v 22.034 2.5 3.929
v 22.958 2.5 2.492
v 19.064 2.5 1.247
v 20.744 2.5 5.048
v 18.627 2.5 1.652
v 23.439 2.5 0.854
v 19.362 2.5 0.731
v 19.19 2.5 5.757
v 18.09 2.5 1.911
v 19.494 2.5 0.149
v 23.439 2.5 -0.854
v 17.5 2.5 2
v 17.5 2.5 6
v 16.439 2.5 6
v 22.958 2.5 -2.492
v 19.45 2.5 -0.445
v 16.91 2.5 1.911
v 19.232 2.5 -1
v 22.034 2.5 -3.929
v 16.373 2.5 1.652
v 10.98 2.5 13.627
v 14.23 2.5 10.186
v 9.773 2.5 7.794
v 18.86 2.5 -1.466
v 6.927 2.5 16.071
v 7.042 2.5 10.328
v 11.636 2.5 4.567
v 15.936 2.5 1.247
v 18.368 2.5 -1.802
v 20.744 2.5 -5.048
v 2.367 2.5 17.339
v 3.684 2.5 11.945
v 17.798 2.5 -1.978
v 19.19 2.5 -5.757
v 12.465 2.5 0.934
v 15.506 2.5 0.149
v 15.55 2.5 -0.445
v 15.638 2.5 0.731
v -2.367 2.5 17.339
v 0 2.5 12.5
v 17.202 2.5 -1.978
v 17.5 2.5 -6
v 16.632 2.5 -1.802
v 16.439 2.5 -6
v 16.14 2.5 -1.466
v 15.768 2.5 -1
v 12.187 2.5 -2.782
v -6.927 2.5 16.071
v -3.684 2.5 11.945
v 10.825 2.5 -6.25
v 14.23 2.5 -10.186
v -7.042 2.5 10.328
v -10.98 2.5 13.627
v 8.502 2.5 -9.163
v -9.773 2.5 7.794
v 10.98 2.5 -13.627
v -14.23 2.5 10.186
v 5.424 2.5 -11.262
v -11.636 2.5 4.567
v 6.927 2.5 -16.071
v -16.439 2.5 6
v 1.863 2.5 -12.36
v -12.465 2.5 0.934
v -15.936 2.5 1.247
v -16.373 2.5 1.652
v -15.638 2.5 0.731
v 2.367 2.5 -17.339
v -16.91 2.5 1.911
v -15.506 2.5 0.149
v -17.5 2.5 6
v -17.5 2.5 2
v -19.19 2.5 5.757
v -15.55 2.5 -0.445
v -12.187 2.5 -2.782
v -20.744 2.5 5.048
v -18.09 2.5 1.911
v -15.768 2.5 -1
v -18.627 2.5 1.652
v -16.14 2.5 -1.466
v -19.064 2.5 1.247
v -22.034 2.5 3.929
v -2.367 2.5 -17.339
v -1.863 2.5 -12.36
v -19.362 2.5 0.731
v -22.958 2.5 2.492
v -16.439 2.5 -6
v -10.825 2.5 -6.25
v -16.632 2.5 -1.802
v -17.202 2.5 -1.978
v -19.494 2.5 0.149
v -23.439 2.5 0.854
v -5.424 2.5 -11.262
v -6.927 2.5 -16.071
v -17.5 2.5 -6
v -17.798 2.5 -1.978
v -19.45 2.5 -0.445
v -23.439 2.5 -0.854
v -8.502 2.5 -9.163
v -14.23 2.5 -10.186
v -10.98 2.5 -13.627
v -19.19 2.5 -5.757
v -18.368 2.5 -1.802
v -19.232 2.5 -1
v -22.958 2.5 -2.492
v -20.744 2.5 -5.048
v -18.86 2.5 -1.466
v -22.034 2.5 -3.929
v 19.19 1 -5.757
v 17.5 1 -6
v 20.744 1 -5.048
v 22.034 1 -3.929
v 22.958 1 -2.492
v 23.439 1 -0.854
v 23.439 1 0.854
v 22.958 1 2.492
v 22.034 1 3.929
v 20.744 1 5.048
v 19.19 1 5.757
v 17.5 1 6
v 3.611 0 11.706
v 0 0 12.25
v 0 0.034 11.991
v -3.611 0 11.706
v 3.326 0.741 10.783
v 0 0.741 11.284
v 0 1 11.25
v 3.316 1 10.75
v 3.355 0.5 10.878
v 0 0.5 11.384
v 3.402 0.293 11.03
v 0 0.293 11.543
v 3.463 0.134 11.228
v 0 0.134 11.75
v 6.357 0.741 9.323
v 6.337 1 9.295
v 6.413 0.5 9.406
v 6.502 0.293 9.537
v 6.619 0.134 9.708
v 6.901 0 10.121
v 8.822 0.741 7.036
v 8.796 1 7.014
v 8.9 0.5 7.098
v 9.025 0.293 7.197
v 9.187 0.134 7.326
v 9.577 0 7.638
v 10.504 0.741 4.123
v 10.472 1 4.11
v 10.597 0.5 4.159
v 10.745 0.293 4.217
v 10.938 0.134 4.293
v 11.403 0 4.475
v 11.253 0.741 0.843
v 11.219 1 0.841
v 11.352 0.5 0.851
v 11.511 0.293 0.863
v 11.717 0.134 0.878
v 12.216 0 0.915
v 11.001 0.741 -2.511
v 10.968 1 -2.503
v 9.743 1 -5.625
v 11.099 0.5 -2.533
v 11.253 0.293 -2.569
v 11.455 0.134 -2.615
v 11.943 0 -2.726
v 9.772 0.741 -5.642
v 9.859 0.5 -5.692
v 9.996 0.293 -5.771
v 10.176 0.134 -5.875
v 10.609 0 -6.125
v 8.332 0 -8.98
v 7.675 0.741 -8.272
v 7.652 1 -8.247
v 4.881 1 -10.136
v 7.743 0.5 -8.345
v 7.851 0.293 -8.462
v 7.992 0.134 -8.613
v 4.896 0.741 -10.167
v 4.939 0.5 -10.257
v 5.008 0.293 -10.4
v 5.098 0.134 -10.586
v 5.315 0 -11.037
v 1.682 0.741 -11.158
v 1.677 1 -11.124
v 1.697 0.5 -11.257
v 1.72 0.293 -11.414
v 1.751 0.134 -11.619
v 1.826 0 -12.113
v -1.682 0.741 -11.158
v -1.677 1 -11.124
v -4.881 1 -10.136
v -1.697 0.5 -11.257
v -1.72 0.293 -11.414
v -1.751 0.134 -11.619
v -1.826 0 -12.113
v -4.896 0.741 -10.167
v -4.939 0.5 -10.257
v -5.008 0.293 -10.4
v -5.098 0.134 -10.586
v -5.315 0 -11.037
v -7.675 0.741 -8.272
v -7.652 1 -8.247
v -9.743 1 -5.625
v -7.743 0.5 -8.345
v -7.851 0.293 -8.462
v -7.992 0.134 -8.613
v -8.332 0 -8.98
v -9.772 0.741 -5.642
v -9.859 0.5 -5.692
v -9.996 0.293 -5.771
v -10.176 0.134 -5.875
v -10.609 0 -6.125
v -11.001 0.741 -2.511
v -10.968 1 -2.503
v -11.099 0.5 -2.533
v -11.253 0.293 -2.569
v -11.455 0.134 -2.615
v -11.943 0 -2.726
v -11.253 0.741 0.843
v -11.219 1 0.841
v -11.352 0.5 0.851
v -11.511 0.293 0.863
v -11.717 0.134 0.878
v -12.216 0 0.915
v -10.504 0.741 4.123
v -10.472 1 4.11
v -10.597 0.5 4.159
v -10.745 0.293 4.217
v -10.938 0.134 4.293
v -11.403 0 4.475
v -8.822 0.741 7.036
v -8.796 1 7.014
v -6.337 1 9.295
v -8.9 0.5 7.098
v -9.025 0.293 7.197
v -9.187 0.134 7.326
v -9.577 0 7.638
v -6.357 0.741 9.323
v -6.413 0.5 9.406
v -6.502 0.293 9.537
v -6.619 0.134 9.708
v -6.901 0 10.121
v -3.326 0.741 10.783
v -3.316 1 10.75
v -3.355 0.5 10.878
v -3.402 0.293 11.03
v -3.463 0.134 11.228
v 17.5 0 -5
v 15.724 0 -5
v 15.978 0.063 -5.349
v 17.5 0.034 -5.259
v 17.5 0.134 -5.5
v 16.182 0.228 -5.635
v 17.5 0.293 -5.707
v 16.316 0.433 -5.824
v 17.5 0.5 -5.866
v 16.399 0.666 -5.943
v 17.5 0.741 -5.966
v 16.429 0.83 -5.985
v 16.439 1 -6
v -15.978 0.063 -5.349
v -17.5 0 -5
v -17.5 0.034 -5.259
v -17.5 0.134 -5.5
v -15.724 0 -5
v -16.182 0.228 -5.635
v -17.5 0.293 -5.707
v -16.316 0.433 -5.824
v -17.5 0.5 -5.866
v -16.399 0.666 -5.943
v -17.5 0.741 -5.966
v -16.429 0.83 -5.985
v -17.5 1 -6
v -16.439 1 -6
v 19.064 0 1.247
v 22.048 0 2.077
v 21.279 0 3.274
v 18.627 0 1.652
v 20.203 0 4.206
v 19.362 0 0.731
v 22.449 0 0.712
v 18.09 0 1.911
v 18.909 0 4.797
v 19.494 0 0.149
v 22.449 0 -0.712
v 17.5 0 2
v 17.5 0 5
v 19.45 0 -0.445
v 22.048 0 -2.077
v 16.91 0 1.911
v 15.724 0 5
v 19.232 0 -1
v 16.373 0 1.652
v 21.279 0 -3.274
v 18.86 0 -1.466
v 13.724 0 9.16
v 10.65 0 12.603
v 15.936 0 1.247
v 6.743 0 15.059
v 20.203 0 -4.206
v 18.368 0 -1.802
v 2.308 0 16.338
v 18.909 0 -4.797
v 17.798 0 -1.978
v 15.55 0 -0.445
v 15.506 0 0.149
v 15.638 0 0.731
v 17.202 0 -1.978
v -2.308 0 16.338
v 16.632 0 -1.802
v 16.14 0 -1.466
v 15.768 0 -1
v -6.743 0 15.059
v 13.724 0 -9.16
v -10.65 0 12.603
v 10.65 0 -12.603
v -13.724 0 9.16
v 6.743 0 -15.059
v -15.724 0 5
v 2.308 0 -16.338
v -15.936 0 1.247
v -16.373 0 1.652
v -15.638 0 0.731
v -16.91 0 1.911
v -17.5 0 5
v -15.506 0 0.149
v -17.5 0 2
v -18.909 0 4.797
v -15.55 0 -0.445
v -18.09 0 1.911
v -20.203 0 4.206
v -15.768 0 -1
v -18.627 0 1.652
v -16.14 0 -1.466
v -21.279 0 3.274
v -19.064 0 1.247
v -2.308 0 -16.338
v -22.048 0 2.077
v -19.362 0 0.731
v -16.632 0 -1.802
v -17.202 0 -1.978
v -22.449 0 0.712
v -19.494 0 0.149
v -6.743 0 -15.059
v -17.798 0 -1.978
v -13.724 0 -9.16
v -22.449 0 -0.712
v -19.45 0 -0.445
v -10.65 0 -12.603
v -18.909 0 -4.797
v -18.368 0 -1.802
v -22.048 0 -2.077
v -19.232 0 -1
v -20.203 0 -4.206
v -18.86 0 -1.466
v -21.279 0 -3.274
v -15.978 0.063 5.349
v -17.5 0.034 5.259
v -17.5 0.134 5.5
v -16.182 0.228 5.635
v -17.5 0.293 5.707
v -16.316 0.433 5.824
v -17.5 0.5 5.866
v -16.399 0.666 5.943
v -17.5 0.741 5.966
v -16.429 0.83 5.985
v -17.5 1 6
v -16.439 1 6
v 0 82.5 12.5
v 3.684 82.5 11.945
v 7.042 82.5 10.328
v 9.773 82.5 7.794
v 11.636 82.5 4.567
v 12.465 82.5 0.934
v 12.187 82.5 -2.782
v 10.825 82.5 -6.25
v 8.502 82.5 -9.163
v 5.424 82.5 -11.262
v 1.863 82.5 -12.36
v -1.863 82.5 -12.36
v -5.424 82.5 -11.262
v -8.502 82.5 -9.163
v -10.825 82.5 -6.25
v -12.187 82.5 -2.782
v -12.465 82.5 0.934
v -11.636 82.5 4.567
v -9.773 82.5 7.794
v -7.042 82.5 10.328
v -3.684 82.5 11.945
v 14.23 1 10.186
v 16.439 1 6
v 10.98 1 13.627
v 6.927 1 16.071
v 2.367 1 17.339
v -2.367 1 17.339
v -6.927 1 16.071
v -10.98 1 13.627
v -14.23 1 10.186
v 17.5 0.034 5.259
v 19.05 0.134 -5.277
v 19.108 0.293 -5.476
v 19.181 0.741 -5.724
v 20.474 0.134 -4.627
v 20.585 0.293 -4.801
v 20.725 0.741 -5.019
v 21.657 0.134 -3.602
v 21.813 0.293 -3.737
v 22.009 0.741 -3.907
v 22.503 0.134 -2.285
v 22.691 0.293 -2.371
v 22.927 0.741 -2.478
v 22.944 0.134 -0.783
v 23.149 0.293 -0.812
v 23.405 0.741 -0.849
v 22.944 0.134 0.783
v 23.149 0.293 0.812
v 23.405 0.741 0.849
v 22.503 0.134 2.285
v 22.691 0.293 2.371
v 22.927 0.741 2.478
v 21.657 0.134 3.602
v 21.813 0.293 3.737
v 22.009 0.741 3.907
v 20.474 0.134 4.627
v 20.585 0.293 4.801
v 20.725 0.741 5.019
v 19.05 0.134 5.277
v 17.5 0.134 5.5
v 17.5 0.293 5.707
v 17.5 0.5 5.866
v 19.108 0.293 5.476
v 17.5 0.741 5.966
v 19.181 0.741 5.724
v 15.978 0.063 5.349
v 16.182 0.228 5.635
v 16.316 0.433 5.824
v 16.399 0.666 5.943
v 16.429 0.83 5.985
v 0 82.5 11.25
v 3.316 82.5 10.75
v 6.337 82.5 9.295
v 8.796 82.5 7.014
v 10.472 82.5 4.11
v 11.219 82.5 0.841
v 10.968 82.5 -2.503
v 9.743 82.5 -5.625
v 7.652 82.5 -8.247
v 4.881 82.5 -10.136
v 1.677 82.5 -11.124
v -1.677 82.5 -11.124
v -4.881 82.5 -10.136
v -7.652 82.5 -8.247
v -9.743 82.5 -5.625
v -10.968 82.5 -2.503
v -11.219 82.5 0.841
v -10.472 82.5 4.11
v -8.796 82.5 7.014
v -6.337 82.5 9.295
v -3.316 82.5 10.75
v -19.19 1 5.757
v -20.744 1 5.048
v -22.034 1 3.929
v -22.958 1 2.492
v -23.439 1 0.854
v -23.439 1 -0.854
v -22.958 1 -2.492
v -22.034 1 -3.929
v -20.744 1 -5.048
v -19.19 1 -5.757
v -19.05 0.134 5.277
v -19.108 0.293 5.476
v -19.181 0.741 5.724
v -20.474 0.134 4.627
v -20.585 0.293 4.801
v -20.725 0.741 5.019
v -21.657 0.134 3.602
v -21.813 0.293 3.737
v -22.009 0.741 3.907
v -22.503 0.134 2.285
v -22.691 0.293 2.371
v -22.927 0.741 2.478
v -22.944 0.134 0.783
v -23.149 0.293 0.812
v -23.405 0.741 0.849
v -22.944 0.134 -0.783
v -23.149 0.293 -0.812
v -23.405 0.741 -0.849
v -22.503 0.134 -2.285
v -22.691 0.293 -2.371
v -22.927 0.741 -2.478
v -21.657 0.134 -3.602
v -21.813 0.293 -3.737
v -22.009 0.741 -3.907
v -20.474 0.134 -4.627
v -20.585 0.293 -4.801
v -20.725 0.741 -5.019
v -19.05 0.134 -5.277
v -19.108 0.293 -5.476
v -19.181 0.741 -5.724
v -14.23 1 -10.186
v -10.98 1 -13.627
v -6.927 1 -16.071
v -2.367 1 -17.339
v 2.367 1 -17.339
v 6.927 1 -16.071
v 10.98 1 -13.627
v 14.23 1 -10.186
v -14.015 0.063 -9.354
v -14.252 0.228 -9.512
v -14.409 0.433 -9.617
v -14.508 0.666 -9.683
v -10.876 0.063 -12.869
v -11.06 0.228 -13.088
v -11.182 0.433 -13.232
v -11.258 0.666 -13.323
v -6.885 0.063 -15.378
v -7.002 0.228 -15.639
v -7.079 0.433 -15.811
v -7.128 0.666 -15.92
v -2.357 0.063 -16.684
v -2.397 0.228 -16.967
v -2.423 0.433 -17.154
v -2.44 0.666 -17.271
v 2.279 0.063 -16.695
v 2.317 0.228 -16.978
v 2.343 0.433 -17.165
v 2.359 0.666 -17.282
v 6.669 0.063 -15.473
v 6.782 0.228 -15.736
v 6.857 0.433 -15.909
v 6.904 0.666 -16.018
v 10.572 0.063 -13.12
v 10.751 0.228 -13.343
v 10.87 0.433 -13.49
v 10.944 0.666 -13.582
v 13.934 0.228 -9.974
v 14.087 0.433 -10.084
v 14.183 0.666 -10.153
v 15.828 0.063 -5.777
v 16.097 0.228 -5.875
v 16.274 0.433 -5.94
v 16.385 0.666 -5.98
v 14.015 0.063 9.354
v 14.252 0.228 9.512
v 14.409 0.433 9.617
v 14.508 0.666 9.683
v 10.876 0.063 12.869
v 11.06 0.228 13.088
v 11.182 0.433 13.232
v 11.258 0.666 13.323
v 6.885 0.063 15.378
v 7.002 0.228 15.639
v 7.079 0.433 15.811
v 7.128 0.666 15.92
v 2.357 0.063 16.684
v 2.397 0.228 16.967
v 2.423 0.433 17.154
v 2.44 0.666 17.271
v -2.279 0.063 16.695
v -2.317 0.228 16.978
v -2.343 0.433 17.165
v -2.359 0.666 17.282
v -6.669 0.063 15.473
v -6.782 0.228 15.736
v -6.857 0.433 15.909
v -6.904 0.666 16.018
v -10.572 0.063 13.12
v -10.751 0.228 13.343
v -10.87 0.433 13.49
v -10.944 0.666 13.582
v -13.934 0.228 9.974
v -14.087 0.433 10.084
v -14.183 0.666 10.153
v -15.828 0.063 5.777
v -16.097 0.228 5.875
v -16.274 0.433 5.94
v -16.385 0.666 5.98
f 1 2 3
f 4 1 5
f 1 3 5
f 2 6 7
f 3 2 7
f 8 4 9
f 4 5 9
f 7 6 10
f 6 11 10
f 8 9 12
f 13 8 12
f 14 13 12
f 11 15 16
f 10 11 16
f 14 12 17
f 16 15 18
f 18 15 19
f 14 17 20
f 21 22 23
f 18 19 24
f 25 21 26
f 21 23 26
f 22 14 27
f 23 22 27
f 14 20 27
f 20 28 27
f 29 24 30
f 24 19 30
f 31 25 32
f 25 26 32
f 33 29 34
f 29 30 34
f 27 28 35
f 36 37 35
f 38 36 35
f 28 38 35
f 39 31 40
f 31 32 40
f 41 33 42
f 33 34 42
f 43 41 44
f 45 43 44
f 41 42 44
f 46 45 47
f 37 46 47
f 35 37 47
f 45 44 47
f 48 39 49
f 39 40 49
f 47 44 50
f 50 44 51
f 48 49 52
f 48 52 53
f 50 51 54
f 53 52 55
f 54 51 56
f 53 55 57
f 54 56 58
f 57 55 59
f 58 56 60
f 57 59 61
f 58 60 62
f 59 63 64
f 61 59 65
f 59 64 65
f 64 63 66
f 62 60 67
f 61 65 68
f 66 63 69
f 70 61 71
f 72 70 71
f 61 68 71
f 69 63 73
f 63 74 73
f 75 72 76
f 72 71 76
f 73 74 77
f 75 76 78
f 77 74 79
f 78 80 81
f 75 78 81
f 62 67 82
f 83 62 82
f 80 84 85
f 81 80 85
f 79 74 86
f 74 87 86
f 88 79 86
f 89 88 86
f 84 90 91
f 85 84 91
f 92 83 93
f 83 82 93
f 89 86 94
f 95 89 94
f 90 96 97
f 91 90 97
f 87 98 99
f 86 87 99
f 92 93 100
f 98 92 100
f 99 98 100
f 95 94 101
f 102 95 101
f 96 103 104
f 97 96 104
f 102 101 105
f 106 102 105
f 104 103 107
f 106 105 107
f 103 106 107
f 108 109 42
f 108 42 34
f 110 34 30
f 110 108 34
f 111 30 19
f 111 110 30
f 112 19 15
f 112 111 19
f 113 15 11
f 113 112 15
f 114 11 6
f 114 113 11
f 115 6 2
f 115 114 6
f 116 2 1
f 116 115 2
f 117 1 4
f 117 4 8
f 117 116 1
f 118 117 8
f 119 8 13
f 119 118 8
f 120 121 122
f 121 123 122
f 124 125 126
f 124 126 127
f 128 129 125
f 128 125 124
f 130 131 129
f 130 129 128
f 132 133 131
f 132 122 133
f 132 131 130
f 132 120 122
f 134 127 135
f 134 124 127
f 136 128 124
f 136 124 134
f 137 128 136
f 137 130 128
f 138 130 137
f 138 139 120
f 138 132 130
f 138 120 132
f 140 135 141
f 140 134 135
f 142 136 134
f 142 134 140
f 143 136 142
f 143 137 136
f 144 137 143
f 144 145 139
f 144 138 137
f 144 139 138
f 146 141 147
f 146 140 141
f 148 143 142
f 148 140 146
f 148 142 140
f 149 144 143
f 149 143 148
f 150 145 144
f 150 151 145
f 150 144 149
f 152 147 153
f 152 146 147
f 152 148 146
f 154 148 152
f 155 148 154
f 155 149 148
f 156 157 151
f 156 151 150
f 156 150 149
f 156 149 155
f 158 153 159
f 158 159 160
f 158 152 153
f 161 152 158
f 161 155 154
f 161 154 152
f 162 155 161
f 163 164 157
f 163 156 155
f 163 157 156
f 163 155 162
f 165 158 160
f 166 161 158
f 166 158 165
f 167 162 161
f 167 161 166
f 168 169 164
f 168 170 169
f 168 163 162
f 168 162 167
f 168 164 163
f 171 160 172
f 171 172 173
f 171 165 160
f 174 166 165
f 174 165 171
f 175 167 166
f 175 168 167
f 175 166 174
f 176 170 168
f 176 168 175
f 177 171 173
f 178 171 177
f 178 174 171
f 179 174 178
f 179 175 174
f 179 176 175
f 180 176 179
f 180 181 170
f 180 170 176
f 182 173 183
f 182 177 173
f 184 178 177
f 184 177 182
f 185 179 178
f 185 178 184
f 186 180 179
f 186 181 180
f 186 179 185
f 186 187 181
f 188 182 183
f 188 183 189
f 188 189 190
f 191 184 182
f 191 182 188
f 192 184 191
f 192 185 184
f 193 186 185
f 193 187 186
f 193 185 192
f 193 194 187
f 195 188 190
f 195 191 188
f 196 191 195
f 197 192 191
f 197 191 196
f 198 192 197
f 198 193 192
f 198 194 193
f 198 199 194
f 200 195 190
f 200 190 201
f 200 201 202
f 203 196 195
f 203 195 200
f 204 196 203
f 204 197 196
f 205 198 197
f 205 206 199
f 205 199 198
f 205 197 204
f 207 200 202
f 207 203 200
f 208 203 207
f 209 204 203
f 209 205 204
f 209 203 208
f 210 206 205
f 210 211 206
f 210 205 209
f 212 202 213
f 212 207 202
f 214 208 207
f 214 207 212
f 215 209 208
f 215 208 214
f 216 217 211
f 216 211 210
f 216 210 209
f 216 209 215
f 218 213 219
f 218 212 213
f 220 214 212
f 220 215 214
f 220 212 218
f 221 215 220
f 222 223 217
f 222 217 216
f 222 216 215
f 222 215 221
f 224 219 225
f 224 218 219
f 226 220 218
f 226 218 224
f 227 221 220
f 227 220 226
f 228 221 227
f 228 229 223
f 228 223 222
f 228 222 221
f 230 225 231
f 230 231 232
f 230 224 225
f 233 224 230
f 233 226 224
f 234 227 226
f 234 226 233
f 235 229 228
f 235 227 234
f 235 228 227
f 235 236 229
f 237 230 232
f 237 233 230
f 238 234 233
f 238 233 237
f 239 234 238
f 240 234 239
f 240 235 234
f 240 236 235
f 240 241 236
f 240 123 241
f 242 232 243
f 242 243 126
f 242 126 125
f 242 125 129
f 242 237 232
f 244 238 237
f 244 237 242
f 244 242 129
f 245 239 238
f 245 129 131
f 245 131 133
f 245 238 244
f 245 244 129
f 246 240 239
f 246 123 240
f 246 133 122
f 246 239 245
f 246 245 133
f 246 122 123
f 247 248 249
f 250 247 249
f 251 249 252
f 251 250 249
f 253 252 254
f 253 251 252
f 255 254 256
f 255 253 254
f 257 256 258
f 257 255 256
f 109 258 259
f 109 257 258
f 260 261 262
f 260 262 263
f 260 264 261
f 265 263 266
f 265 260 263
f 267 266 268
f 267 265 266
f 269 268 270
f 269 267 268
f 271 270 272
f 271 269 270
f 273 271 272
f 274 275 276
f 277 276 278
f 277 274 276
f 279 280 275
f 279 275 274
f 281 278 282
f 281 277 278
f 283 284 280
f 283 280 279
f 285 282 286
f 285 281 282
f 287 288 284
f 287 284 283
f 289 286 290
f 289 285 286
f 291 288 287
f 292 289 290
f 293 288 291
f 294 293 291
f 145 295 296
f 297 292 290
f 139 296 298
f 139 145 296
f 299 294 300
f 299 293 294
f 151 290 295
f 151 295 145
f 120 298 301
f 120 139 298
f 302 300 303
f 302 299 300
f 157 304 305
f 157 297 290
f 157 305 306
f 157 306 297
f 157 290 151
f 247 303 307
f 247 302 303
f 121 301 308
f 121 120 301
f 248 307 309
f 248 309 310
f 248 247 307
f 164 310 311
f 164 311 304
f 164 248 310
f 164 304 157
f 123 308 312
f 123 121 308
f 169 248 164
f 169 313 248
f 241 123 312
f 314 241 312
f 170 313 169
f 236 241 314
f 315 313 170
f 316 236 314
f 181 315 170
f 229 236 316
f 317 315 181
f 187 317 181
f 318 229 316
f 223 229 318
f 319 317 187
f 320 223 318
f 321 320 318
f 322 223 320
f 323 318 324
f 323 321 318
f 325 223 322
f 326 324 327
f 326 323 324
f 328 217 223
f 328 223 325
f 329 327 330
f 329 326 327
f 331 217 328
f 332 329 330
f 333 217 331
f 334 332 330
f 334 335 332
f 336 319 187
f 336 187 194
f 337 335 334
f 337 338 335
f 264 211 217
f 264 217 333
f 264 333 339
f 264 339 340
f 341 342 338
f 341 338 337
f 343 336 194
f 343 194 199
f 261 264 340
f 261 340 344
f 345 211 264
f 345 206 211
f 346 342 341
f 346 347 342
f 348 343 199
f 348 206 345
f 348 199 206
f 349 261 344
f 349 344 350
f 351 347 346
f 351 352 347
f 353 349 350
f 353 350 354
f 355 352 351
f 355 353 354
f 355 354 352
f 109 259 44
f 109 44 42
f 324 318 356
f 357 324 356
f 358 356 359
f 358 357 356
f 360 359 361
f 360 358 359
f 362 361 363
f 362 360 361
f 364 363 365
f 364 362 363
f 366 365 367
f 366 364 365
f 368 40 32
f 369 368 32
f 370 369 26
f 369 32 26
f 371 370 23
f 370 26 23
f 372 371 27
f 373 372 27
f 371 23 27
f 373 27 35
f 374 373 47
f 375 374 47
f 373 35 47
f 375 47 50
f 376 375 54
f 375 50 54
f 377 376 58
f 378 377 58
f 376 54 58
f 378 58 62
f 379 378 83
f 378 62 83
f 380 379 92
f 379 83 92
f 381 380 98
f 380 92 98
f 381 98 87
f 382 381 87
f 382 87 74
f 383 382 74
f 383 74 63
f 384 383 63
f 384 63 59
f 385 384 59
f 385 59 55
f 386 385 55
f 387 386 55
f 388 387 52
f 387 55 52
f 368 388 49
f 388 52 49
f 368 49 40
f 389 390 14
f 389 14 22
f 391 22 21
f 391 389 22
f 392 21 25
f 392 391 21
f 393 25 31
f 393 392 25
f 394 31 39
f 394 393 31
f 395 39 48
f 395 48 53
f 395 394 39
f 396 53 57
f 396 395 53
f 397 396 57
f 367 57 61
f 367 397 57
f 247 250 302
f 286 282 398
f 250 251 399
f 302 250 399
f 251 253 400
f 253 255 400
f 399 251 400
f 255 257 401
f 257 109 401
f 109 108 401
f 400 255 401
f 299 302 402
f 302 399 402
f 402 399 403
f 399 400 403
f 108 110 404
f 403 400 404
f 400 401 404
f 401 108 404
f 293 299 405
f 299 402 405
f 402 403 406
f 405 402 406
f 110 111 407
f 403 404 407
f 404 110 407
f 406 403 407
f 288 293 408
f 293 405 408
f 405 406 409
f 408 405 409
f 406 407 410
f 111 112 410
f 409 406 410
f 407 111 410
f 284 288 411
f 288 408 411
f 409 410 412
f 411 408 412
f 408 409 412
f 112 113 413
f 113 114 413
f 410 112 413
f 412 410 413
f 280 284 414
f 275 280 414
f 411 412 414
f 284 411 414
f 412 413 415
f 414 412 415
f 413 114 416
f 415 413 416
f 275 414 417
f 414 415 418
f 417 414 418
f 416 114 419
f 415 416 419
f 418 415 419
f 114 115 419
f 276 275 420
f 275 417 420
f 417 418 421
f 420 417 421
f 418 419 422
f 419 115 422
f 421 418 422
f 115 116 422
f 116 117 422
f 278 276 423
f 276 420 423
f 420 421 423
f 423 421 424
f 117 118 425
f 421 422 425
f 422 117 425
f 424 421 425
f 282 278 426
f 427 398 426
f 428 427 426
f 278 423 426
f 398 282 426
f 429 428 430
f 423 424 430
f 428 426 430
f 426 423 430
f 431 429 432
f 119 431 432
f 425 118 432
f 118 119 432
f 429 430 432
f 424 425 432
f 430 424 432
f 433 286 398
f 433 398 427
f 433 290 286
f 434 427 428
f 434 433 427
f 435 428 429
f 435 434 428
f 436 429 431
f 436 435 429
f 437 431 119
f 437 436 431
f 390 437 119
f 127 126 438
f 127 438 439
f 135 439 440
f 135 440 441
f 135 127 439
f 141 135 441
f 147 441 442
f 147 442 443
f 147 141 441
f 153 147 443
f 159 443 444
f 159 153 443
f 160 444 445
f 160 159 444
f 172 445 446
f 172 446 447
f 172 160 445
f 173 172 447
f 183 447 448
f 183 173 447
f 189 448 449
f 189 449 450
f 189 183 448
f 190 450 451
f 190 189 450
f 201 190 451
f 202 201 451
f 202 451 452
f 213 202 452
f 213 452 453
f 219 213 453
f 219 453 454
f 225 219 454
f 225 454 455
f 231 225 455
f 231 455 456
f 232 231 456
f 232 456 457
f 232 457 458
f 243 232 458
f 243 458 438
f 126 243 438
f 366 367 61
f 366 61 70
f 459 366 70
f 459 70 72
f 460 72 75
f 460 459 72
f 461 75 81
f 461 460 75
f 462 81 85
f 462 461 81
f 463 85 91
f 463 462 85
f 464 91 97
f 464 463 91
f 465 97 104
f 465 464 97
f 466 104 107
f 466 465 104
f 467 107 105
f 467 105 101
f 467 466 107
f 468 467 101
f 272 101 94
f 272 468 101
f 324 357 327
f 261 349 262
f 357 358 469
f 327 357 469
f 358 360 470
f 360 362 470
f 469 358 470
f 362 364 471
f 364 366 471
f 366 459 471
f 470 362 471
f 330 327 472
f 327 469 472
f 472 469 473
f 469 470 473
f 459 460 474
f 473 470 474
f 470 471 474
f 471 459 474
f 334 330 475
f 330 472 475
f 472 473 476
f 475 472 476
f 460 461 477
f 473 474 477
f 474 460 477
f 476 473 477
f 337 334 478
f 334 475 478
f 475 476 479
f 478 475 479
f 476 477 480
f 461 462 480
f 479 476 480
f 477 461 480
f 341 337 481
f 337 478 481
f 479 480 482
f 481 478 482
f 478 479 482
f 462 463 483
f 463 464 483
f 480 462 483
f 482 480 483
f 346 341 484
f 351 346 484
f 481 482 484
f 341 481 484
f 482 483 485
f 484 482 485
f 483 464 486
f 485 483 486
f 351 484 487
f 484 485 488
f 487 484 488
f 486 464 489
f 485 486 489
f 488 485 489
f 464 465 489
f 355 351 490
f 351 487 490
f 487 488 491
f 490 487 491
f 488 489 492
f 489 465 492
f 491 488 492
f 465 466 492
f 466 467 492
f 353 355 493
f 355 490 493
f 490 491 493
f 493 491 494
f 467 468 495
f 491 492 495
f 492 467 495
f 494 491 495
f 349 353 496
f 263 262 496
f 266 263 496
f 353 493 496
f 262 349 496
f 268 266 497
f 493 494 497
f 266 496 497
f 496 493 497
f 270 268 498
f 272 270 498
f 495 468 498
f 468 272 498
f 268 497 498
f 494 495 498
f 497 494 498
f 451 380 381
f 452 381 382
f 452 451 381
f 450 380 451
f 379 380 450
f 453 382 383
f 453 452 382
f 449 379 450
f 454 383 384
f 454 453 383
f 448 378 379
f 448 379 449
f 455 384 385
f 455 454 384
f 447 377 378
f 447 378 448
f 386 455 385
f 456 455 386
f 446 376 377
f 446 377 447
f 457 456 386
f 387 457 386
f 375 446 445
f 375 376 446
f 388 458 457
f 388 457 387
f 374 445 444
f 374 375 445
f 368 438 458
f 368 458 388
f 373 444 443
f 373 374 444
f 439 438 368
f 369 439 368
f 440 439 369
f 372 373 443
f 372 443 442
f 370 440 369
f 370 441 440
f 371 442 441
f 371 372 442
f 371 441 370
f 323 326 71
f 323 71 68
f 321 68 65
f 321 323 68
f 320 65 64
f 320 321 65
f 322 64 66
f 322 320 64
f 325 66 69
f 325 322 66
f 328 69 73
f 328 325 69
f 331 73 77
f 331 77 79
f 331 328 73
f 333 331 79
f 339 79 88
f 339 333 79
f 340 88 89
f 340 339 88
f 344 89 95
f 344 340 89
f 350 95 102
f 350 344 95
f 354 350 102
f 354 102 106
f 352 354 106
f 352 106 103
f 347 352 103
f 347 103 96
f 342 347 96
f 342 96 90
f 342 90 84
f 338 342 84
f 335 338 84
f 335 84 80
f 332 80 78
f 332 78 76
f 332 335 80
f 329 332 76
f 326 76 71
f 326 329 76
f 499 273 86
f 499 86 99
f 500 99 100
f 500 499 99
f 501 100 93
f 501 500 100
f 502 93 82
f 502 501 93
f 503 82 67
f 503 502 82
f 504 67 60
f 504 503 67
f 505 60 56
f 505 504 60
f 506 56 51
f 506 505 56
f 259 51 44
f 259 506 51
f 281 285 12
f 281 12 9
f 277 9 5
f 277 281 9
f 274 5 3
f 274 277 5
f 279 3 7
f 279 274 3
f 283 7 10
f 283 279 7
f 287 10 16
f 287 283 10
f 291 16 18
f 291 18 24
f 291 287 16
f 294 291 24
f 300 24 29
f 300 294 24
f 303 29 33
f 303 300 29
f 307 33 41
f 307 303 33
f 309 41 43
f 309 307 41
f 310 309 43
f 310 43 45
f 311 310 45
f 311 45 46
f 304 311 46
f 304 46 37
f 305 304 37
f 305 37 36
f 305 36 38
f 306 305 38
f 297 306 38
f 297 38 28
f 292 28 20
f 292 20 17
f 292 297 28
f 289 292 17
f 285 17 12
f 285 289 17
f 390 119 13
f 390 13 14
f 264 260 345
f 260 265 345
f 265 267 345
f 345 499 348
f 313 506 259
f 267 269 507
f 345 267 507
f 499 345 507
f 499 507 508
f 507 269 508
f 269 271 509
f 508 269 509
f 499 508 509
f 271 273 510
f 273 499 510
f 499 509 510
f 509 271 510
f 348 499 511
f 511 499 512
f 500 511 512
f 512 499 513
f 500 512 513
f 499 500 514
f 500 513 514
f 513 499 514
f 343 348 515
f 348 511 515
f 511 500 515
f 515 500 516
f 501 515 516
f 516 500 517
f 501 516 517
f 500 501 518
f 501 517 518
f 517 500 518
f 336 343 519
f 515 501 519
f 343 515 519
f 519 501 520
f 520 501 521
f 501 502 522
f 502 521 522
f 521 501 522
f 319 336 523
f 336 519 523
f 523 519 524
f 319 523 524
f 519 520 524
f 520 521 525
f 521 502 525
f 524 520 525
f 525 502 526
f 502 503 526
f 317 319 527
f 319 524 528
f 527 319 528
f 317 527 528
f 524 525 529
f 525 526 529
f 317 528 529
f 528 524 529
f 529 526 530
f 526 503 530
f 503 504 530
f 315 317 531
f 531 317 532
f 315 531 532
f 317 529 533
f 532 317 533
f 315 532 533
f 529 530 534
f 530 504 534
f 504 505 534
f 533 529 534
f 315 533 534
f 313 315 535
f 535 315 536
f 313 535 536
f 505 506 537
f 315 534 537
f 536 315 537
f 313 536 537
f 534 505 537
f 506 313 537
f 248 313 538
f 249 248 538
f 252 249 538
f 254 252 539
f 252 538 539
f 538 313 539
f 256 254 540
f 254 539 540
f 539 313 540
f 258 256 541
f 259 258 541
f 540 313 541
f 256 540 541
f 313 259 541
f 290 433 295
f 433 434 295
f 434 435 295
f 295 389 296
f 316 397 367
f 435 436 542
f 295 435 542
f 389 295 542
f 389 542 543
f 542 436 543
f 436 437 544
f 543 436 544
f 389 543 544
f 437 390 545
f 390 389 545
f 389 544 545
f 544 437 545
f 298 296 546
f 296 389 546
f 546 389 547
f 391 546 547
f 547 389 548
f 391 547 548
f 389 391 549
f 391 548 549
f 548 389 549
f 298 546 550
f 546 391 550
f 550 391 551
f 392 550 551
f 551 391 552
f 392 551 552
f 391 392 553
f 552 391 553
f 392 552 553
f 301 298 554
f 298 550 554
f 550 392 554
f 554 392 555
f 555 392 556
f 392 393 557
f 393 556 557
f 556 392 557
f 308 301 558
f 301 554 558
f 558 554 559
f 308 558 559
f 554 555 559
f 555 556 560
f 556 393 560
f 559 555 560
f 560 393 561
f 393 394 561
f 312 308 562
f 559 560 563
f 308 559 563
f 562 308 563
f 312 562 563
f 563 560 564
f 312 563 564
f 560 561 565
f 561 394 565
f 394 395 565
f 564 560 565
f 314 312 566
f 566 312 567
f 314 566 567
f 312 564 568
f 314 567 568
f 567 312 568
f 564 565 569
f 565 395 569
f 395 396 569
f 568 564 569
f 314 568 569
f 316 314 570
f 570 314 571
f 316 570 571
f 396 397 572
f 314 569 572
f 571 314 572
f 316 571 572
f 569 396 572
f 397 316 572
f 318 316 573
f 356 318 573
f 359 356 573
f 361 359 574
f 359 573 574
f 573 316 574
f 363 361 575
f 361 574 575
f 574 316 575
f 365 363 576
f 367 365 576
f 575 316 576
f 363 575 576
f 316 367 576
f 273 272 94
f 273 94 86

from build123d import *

# Parameters (mm, degrees)
CROQUIS1_R              = 11.25
CROQUIS1_R_2            = 2
SALIENTE_EXTRUIR2_DEPTH = 2.5
CROQUIS2_R              = 12.5
CROQUIS2_R_2            = 11.25
SALIENTE_EXTRUIR4_DEPTH = 80
REDONDEO1_R             = 1


with BuildPart() as part:
    # Croquis1 → Saliente-Extruir2 (new body)
    with BuildSketch(Plane(origin=(0, 0, 0), x_dir=(1, 0, 0), z_dir=(0, 1, 0))):
        with BuildLine():
            Line((-17.5, 6), (-16.439282223, 6))
            ThreePointArc((-16.439282223, 6), (0, 17.5), (16.439282223, 6))
            Line((16.439282223, 6), (17.5, 6))
            ThreePointArc((17.5, 6), (23.5, 0), (17.5, -6))
            Line((17.5, -6), (16.439282223, -6))
            ThreePointArc((16.439282223, -6), (0, -17.5), (-16.439282223, -6))
            Line((-16.439282223, -6), (-17.5, -6))
            ThreePointArc((-17.5, -6), (-23.5, 0), (-17.5, 6))
        make_face()
        with Locations(Location((0, 0, 0), (0, 0, 270))):
            Circle(CROQUIS1_R, mode=Mode.SUBTRACT)
        with Locations(Location((-17.5, 0, 0), (0, 0, 270))):
            Circle(CROQUIS1_R_2, mode=Mode.SUBTRACT)
        with Locations(Location((17.5, 0, 0), (0, 0, 270))):
            Circle(CROQUIS1_R_2, mode=Mode.SUBTRACT)
    extrude(amount=SALIENTE_EXTRUIR2_DEPTH)

    # Croquis2 → Saliente-Extruir4 (add)
    with BuildSketch(Plane(origin=(0, 2.5, 0), x_dir=(1, 0, 0), z_dir=(0, 1, 0))):
        with Locations(Location((0, 0, 0), (0, 0, 270))):
            Circle(CROQUIS2_R)
        with Locations(Location((0, 0, 0), (0, 0, 270))):
            Circle(CROQUIS2_R_2, mode=Mode.SUBTRACT)
    extrude(amount=SALIENTE_EXTRUIR4_DEPTH)

    # Redondeo1
    redondeo1_edges = [part.edges().sort_by_distance(p)[0] for p in [
        (16.969641111, 0, 6),
        (0, 0, 17.5),
        (-16.969641111, 0, 6),
        (-23.5, 0, 0),
        (0, 0, -11.25),
        (-16.969641111, 0, -6),
        (0, 0, -17.5),
        (16.969641111, 0, -6),
        (23.5, 0, 0),
    ]]
    fillet(redondeo1_edges, radius=REDONDEO1_R)


solid = part.part
